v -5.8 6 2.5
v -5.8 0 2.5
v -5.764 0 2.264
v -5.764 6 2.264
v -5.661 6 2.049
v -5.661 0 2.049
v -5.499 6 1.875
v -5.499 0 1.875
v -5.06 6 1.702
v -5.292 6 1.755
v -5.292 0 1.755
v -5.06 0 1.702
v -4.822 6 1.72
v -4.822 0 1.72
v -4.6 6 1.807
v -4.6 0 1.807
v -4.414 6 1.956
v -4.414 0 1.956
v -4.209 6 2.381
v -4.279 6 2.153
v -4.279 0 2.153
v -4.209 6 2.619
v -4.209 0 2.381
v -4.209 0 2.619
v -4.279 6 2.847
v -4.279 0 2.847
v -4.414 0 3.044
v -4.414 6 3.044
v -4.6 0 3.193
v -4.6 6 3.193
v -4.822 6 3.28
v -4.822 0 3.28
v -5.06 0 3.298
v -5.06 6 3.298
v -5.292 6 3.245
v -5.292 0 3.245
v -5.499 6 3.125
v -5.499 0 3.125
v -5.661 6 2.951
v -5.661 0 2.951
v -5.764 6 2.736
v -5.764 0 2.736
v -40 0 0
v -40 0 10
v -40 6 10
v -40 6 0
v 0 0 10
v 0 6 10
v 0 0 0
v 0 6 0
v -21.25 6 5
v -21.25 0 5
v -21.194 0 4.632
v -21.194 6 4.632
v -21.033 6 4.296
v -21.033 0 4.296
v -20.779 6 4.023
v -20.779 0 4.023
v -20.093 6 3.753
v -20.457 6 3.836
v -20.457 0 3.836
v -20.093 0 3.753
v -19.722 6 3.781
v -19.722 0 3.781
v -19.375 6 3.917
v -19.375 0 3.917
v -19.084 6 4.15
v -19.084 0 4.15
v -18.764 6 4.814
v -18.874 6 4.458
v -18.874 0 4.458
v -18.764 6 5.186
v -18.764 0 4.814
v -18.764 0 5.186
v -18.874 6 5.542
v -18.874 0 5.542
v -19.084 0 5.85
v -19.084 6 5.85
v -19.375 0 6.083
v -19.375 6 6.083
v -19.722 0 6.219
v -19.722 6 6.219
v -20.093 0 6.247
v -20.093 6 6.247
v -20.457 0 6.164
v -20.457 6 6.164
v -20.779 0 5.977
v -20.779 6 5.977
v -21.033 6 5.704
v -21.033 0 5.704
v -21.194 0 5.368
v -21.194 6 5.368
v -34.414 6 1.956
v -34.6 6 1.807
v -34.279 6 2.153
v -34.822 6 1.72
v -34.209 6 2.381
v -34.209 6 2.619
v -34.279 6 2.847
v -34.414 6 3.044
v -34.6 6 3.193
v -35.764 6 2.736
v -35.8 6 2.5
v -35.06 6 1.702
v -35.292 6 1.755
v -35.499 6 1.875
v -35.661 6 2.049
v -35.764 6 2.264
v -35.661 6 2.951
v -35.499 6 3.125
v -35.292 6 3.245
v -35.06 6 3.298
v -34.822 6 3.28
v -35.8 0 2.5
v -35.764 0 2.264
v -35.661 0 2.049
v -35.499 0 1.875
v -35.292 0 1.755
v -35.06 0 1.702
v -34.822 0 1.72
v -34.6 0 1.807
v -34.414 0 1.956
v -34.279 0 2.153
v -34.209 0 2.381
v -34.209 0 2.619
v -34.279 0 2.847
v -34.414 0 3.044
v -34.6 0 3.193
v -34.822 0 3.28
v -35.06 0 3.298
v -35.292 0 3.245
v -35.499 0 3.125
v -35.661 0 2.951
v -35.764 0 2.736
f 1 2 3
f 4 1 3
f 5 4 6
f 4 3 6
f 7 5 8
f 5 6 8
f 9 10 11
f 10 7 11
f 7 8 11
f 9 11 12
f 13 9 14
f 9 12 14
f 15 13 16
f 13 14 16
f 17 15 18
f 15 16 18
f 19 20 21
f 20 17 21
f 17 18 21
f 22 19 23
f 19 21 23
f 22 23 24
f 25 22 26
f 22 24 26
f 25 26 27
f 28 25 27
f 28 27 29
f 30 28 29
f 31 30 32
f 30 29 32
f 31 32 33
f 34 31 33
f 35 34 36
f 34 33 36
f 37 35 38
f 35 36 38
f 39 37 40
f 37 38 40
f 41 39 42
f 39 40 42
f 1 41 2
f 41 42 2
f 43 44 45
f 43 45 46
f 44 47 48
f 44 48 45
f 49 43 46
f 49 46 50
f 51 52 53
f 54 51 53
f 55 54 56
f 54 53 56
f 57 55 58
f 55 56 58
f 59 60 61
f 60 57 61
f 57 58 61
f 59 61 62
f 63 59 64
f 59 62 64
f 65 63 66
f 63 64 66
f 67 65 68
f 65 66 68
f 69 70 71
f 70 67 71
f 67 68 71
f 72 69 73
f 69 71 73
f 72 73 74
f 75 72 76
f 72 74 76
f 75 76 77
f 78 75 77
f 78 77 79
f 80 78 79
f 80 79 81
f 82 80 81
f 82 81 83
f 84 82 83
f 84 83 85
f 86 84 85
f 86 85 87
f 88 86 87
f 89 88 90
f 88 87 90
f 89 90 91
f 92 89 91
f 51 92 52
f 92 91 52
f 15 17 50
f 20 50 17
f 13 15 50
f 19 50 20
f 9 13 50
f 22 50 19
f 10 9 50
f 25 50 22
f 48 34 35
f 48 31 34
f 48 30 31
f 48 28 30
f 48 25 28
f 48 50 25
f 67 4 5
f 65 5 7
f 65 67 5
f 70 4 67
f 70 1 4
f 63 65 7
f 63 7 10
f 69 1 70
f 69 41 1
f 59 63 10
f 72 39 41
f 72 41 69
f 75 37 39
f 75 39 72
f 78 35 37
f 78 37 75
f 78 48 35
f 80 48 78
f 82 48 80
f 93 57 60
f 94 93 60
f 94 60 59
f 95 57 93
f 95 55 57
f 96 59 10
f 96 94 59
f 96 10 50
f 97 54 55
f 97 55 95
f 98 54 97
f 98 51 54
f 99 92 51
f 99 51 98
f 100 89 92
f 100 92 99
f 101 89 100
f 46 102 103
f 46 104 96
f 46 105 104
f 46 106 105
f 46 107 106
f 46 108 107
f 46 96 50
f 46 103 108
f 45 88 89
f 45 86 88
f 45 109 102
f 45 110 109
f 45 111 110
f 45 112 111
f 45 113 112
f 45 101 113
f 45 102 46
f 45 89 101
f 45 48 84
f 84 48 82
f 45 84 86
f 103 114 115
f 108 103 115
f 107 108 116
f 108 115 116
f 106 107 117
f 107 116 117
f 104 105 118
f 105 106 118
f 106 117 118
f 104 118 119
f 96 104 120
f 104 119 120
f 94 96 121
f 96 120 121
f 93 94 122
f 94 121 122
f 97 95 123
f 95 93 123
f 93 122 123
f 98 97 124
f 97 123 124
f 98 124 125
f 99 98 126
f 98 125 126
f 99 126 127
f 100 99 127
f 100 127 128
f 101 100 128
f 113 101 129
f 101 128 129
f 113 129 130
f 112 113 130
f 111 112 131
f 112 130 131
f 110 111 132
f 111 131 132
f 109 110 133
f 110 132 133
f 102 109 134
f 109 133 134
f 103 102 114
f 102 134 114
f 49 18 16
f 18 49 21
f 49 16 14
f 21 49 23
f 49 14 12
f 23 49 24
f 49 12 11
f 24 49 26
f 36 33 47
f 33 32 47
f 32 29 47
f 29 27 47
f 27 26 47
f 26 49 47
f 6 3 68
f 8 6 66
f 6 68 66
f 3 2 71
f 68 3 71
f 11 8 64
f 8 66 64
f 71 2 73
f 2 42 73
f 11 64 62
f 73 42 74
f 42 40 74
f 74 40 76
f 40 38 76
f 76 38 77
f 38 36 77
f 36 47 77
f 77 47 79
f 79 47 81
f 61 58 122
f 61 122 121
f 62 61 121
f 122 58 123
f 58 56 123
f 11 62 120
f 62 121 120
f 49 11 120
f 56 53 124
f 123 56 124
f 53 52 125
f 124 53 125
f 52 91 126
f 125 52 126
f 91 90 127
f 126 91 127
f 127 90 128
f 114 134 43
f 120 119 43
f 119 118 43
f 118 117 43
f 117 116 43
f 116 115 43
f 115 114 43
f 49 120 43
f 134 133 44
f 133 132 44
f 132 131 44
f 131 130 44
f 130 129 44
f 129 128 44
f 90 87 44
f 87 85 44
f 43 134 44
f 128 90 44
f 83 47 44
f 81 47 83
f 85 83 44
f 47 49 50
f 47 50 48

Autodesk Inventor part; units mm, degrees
ref_plane "YZ Plane" through (0, 0, 0) normal (1, 0, 0) x (0, 1, 0)
ref_plane "XZ Plane" through (0, 0, 0) normal (0, 1, 0) x (-1, 0, 0)
ref_plane "XY Plane" through (0, 0, 0) normal (0, 0, 1) x (1, 0, 0)
sketch "Sketch1" plane through (0, 0, 0) normal (0, 1, 0) x (-1, 0, 0)
  line L0 (0, 10) -> (40, 10)
  line L1 (40, 10) -> (40, 0)
  line L2 (40, 0) -> (0, 0)
  line L3 (0, 0) -> (0, 10)
  circle A0 centre (5, 2.5) radius 0.8
  circle A1 centre (35, 2.5) radius 0.8
  circle A2 centre (20, 5) radius 1.25
  dimension "d0" = 1.6
  dimension "d1" = 2.5
  dimension "d2" = 5
  dimension "d3" = 5
  dimension "d4" = 30
  dimension "d5" = 10
  dimension "d8" = 2.5
  dimension "d9" = 20
  dimension "d10" = 5
extrude "Extrusion1" add sketch "Sketch1" along normal blind 6
properties part number "phone_holder_slider_insert" material "Acrylic, Clear"
